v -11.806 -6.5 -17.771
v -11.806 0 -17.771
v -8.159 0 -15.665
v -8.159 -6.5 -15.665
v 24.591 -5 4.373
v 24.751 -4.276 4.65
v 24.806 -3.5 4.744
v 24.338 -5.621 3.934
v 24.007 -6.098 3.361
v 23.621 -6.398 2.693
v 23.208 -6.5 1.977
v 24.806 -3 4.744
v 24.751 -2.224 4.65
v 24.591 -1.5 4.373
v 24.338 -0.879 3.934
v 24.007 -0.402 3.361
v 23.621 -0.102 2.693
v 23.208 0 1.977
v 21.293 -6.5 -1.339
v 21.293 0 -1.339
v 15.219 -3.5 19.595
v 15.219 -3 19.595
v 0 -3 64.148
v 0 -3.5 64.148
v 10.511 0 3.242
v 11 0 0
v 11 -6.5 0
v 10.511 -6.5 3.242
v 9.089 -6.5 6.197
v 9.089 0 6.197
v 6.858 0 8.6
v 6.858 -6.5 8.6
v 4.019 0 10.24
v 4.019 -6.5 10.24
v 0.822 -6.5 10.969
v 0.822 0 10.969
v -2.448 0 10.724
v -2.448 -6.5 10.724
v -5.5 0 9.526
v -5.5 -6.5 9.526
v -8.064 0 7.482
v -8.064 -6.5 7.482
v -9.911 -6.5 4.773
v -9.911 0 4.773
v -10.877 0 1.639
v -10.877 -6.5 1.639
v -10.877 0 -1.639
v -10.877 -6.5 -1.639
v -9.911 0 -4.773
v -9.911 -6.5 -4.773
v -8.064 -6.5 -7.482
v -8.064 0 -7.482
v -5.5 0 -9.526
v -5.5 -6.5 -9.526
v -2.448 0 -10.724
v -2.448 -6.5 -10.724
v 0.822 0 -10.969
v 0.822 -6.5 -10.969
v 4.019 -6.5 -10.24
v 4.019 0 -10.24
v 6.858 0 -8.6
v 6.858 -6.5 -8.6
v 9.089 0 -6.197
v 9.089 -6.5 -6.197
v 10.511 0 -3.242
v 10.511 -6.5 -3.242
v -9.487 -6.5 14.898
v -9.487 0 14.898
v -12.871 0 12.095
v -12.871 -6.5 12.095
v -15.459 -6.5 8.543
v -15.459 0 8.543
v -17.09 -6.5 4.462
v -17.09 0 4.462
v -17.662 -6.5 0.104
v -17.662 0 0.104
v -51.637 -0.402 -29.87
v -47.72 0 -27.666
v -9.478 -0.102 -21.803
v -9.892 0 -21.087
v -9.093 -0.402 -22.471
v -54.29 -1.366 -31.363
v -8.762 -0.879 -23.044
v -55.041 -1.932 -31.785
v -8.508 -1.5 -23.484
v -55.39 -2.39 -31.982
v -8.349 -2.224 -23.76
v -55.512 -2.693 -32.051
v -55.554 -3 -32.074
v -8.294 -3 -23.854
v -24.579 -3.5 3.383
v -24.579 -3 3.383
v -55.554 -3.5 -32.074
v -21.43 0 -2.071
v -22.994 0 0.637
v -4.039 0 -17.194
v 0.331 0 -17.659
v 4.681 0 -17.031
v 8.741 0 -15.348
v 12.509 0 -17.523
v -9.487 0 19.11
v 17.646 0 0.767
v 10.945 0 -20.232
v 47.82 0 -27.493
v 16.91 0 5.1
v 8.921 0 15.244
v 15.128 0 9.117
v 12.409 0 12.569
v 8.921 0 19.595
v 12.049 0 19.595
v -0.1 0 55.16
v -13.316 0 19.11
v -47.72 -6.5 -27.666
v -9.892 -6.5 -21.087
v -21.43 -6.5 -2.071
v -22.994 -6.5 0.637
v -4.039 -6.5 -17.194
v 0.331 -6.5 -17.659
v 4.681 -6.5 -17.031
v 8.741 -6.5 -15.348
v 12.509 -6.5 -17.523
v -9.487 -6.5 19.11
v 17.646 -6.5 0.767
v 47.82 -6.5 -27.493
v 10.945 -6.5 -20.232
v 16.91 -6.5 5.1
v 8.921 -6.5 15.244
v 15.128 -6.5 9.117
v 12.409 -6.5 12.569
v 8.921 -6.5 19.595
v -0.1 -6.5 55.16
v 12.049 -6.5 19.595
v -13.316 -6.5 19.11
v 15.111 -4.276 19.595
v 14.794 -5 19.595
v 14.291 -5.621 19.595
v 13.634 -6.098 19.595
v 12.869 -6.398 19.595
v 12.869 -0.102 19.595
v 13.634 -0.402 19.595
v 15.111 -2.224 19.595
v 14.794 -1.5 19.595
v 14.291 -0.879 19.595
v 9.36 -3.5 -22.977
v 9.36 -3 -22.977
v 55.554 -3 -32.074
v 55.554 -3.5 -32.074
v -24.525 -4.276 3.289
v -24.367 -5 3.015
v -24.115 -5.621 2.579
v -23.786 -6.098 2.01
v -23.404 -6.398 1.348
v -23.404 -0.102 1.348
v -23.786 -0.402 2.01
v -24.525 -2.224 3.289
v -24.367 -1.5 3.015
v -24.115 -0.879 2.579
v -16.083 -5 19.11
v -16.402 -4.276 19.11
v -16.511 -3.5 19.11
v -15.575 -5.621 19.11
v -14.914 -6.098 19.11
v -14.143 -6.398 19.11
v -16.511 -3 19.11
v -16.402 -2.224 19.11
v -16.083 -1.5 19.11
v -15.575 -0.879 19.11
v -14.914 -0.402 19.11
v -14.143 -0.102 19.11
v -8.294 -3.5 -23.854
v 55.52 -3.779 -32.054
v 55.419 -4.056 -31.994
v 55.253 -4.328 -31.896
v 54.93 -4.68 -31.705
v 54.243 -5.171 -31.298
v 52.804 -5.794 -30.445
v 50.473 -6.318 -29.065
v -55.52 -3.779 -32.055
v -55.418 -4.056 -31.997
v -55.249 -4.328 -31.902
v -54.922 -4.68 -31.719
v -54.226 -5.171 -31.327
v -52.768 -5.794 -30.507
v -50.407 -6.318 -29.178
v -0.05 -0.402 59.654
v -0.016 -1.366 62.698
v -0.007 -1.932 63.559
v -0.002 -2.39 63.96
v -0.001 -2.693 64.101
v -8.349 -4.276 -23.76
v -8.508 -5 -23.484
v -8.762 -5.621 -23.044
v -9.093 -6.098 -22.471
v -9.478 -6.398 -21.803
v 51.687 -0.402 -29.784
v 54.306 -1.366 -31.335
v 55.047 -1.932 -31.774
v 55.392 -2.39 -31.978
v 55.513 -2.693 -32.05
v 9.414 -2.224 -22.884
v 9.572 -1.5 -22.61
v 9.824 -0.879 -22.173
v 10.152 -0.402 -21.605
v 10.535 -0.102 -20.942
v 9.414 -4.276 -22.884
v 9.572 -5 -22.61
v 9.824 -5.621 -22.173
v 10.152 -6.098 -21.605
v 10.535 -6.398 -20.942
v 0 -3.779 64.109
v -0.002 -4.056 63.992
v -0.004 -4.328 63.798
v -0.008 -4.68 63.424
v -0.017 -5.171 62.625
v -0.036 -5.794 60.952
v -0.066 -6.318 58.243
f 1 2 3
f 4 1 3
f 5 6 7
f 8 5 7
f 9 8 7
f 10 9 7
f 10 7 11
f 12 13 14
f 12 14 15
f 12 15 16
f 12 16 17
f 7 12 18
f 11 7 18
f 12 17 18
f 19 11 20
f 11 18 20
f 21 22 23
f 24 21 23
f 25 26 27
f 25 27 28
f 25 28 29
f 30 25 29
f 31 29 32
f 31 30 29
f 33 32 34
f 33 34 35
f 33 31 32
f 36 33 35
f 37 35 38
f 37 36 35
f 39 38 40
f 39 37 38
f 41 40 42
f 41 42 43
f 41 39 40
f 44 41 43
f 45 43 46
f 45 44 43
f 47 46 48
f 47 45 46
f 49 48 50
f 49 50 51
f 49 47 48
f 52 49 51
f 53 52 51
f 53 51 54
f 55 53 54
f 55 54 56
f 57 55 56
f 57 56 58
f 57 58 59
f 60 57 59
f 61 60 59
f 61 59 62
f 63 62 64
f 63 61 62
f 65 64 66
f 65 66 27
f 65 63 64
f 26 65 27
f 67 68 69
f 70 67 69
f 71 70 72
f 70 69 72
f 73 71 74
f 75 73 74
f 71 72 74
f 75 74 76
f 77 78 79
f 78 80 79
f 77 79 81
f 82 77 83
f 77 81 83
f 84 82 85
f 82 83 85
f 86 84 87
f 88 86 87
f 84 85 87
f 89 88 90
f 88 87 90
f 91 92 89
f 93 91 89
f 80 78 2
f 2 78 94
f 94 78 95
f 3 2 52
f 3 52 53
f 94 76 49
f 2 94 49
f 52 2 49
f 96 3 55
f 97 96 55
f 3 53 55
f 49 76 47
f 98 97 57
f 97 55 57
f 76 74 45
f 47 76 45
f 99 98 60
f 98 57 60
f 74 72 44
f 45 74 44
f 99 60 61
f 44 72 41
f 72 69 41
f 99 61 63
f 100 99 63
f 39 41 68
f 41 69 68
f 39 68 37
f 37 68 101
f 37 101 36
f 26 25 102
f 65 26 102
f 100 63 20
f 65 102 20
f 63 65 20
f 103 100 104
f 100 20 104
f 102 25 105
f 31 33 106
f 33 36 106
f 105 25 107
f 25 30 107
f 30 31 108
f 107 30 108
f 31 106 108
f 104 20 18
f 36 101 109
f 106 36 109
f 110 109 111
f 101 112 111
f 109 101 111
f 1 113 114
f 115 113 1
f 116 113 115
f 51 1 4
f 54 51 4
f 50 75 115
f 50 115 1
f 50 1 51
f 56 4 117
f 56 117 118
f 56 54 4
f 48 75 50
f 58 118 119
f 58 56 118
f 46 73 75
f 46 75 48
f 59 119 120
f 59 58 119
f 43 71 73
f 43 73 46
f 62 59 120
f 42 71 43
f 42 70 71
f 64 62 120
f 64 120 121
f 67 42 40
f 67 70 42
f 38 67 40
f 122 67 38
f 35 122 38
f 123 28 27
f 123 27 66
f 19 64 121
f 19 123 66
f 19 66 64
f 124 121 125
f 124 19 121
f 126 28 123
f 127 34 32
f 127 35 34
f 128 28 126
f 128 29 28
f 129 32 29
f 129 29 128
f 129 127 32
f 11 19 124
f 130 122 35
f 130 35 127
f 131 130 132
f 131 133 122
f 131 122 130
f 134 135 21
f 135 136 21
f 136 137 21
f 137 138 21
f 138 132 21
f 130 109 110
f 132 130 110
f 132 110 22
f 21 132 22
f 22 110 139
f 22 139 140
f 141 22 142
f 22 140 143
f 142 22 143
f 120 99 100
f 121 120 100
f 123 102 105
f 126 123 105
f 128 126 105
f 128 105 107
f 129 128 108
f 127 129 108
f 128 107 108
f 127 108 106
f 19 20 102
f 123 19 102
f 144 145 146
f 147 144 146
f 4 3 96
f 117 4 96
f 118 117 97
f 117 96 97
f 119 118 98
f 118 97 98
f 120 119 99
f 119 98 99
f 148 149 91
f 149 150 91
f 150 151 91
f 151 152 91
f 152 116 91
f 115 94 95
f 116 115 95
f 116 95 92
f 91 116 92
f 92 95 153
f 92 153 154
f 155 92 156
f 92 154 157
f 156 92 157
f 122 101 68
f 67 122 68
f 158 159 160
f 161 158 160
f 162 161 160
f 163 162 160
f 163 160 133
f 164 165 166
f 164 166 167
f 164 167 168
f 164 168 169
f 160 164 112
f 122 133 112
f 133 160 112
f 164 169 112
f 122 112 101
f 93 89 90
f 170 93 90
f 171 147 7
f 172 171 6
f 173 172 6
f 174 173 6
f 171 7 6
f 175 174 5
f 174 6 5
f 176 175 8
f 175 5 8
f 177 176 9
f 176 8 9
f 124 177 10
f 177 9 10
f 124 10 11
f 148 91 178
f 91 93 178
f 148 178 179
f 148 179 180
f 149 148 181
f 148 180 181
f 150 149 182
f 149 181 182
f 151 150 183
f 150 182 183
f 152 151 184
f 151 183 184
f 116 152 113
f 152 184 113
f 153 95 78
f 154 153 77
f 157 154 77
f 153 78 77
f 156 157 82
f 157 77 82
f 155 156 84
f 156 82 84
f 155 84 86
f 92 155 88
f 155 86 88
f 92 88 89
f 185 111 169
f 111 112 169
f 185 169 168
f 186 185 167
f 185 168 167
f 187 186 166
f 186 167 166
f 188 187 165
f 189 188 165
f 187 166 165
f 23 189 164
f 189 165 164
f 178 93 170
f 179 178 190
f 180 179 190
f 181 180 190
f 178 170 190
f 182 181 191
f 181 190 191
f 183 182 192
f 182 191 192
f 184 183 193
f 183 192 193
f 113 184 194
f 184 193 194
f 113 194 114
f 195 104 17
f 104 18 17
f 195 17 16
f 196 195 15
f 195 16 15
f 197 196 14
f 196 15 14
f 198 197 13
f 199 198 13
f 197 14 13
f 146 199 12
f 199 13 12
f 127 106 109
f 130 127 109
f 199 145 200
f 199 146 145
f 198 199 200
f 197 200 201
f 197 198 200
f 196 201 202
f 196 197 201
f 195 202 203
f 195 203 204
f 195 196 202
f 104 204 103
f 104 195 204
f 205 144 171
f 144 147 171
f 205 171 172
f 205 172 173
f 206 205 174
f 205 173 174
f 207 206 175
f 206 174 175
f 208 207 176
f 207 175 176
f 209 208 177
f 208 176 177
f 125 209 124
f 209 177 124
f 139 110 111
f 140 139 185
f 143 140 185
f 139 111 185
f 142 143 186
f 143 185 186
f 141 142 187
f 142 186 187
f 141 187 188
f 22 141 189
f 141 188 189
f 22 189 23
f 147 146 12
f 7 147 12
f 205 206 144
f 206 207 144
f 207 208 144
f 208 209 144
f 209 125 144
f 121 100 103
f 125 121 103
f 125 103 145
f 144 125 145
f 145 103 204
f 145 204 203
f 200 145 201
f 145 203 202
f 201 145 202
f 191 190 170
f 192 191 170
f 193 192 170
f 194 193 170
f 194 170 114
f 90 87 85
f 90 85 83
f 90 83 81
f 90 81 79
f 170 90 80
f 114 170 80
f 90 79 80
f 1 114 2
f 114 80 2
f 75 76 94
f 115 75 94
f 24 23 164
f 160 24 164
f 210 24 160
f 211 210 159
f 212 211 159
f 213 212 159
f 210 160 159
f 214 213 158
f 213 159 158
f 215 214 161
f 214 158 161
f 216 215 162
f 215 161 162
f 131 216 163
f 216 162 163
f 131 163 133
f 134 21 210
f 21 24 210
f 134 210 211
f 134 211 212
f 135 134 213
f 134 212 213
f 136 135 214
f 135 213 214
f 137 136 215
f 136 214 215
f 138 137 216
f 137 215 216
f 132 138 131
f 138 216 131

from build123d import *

# Parameters (mm, degrees)
F0_R     = 11
F1_DEPTH = 6.5
F2_R     = 3
F3_R     = 3


with BuildPart() as f1:
    # F0 (on Front) → F1 (new body)
    with BuildSketch(Plane.XZ):
        with BuildLine():
            ThreePointArc((8.740666, -15.348029), (15.269948, -8.87637), (17.662425, 0))
            ThreePointArc((17.662425, 0), (17.658261, 0.383509), (17.64577, 0.766837))
            ThreePointArc((17.64577, 0.766837), (15.127751, 9.1166), (8.92145, 15.243654))
            ThreePointArc((8.92145, 15.243654), (-0.331332, 17.659317), (-9.486986, 14.898267))
            ThreePointArc((-9.486986, 14.898267), (-15.459083, 8.542717), (-17.662116, 0.104376))
            ThreePointArc((-17.662116, 0.104376), (-15.127751, -9.1166), (-8.158784, -15.665104))
            ThreePointArc((-8.158784, -15.665104), (0.331332, -17.659317), (8.740666, -15.348029))
        make_face()
        Circle(F0_R, mode=Mode.SUBTRACT)
        with BuildLine():
            ThreePointArc((17.64577, 0.766837), (17.658261, 0.383509), (17.662425, 0))
            ThreePointArc((17.662425, 0), (15.269948, -8.87637), (8.740666, -15.348029))
            Line((8.740666, -15.348029), (12.508677, -17.523491))
            Line((12.508677, -17.523491), (9.359866, -22.977391))
            Line((9.359866, -22.977391), (55.553557, -32.073861))
            Line((55.553557, -32.073861), (24.805502, 4.744098))
            Line((24.805502, 4.744098), (21.293365, -1.339102))
            Line((21.293365, -1.339102), (17.64577, 0.766837))
        make_face()
        with BuildLine():
            ThreePointArc((-9.486986, 14.898267), (-0.331332, 17.659317), (8.92145, 15.243654))
            Line((8.92145, 15.243654), (8.92145, 19.594578))
            Line((8.92145, 19.594578), (15.219072, 19.594578))
            Line((15.219072, 19.594578), (0, 64.147722))
            Line((0, 64.147722), (-16.51126, 19.110146))
            Line((-16.51126, 19.110146), (-9.486986, 19.110146))
            Line((-9.486986, 19.110146), (-9.486986, 14.898267))
        make_face()
        with BuildLine():
            Line((-11.806379, -17.771044), (-8.158784, -15.665104))
            ThreePointArc((-8.158784, -15.665104), (-15.127751, -9.1166), (-17.662116, 0.104376))
            Line((-17.662116, 0.104376), (-21.430127, -2.071086))
            Line((-21.430127, -2.071086), (-24.578938, 3.382814))
            Line((-24.578938, 3.382814), (-55.553557, -32.073861))
            Line((-55.553557, -32.073861), (-8.294242, -23.854243))
            Line((-8.294242, -23.854243), (-11.806379, -17.771044))
        make_face()
    extrude(amount=F1_DEPTH)

    # F2
    f2_edges = [f1.edges().sort_by_distance(p)[0] for p in [
        (-8.25563, -6.5, 41.628934),
        (7.609536, -6.5, 41.87115),
        (40.179529, -6.5, -13.664882),
        (32.456712, -6.5, -27.525626),
        (-31.923899, -6.5, -27.964052),
        (-40.066247, -6.5, -14.345524),
    ]]
    fillet(f2_edges, radius=F2_R)

    # F3
    f3_edges = [f1.edges().sort_by_distance(p)[0] for p in [
        (40.179529, 0, -13.664882),
        (-31.923899, 0, -27.964052),
        (32.456712, 0, -27.525626),
        (-40.066247, 0, -14.345524),
        (-8.25563, 0, 41.628934),
        (7.609536, 0, 41.87115),
    ]]
    fillet(f3_edges, radius=F3_R)


solid = f1.part
